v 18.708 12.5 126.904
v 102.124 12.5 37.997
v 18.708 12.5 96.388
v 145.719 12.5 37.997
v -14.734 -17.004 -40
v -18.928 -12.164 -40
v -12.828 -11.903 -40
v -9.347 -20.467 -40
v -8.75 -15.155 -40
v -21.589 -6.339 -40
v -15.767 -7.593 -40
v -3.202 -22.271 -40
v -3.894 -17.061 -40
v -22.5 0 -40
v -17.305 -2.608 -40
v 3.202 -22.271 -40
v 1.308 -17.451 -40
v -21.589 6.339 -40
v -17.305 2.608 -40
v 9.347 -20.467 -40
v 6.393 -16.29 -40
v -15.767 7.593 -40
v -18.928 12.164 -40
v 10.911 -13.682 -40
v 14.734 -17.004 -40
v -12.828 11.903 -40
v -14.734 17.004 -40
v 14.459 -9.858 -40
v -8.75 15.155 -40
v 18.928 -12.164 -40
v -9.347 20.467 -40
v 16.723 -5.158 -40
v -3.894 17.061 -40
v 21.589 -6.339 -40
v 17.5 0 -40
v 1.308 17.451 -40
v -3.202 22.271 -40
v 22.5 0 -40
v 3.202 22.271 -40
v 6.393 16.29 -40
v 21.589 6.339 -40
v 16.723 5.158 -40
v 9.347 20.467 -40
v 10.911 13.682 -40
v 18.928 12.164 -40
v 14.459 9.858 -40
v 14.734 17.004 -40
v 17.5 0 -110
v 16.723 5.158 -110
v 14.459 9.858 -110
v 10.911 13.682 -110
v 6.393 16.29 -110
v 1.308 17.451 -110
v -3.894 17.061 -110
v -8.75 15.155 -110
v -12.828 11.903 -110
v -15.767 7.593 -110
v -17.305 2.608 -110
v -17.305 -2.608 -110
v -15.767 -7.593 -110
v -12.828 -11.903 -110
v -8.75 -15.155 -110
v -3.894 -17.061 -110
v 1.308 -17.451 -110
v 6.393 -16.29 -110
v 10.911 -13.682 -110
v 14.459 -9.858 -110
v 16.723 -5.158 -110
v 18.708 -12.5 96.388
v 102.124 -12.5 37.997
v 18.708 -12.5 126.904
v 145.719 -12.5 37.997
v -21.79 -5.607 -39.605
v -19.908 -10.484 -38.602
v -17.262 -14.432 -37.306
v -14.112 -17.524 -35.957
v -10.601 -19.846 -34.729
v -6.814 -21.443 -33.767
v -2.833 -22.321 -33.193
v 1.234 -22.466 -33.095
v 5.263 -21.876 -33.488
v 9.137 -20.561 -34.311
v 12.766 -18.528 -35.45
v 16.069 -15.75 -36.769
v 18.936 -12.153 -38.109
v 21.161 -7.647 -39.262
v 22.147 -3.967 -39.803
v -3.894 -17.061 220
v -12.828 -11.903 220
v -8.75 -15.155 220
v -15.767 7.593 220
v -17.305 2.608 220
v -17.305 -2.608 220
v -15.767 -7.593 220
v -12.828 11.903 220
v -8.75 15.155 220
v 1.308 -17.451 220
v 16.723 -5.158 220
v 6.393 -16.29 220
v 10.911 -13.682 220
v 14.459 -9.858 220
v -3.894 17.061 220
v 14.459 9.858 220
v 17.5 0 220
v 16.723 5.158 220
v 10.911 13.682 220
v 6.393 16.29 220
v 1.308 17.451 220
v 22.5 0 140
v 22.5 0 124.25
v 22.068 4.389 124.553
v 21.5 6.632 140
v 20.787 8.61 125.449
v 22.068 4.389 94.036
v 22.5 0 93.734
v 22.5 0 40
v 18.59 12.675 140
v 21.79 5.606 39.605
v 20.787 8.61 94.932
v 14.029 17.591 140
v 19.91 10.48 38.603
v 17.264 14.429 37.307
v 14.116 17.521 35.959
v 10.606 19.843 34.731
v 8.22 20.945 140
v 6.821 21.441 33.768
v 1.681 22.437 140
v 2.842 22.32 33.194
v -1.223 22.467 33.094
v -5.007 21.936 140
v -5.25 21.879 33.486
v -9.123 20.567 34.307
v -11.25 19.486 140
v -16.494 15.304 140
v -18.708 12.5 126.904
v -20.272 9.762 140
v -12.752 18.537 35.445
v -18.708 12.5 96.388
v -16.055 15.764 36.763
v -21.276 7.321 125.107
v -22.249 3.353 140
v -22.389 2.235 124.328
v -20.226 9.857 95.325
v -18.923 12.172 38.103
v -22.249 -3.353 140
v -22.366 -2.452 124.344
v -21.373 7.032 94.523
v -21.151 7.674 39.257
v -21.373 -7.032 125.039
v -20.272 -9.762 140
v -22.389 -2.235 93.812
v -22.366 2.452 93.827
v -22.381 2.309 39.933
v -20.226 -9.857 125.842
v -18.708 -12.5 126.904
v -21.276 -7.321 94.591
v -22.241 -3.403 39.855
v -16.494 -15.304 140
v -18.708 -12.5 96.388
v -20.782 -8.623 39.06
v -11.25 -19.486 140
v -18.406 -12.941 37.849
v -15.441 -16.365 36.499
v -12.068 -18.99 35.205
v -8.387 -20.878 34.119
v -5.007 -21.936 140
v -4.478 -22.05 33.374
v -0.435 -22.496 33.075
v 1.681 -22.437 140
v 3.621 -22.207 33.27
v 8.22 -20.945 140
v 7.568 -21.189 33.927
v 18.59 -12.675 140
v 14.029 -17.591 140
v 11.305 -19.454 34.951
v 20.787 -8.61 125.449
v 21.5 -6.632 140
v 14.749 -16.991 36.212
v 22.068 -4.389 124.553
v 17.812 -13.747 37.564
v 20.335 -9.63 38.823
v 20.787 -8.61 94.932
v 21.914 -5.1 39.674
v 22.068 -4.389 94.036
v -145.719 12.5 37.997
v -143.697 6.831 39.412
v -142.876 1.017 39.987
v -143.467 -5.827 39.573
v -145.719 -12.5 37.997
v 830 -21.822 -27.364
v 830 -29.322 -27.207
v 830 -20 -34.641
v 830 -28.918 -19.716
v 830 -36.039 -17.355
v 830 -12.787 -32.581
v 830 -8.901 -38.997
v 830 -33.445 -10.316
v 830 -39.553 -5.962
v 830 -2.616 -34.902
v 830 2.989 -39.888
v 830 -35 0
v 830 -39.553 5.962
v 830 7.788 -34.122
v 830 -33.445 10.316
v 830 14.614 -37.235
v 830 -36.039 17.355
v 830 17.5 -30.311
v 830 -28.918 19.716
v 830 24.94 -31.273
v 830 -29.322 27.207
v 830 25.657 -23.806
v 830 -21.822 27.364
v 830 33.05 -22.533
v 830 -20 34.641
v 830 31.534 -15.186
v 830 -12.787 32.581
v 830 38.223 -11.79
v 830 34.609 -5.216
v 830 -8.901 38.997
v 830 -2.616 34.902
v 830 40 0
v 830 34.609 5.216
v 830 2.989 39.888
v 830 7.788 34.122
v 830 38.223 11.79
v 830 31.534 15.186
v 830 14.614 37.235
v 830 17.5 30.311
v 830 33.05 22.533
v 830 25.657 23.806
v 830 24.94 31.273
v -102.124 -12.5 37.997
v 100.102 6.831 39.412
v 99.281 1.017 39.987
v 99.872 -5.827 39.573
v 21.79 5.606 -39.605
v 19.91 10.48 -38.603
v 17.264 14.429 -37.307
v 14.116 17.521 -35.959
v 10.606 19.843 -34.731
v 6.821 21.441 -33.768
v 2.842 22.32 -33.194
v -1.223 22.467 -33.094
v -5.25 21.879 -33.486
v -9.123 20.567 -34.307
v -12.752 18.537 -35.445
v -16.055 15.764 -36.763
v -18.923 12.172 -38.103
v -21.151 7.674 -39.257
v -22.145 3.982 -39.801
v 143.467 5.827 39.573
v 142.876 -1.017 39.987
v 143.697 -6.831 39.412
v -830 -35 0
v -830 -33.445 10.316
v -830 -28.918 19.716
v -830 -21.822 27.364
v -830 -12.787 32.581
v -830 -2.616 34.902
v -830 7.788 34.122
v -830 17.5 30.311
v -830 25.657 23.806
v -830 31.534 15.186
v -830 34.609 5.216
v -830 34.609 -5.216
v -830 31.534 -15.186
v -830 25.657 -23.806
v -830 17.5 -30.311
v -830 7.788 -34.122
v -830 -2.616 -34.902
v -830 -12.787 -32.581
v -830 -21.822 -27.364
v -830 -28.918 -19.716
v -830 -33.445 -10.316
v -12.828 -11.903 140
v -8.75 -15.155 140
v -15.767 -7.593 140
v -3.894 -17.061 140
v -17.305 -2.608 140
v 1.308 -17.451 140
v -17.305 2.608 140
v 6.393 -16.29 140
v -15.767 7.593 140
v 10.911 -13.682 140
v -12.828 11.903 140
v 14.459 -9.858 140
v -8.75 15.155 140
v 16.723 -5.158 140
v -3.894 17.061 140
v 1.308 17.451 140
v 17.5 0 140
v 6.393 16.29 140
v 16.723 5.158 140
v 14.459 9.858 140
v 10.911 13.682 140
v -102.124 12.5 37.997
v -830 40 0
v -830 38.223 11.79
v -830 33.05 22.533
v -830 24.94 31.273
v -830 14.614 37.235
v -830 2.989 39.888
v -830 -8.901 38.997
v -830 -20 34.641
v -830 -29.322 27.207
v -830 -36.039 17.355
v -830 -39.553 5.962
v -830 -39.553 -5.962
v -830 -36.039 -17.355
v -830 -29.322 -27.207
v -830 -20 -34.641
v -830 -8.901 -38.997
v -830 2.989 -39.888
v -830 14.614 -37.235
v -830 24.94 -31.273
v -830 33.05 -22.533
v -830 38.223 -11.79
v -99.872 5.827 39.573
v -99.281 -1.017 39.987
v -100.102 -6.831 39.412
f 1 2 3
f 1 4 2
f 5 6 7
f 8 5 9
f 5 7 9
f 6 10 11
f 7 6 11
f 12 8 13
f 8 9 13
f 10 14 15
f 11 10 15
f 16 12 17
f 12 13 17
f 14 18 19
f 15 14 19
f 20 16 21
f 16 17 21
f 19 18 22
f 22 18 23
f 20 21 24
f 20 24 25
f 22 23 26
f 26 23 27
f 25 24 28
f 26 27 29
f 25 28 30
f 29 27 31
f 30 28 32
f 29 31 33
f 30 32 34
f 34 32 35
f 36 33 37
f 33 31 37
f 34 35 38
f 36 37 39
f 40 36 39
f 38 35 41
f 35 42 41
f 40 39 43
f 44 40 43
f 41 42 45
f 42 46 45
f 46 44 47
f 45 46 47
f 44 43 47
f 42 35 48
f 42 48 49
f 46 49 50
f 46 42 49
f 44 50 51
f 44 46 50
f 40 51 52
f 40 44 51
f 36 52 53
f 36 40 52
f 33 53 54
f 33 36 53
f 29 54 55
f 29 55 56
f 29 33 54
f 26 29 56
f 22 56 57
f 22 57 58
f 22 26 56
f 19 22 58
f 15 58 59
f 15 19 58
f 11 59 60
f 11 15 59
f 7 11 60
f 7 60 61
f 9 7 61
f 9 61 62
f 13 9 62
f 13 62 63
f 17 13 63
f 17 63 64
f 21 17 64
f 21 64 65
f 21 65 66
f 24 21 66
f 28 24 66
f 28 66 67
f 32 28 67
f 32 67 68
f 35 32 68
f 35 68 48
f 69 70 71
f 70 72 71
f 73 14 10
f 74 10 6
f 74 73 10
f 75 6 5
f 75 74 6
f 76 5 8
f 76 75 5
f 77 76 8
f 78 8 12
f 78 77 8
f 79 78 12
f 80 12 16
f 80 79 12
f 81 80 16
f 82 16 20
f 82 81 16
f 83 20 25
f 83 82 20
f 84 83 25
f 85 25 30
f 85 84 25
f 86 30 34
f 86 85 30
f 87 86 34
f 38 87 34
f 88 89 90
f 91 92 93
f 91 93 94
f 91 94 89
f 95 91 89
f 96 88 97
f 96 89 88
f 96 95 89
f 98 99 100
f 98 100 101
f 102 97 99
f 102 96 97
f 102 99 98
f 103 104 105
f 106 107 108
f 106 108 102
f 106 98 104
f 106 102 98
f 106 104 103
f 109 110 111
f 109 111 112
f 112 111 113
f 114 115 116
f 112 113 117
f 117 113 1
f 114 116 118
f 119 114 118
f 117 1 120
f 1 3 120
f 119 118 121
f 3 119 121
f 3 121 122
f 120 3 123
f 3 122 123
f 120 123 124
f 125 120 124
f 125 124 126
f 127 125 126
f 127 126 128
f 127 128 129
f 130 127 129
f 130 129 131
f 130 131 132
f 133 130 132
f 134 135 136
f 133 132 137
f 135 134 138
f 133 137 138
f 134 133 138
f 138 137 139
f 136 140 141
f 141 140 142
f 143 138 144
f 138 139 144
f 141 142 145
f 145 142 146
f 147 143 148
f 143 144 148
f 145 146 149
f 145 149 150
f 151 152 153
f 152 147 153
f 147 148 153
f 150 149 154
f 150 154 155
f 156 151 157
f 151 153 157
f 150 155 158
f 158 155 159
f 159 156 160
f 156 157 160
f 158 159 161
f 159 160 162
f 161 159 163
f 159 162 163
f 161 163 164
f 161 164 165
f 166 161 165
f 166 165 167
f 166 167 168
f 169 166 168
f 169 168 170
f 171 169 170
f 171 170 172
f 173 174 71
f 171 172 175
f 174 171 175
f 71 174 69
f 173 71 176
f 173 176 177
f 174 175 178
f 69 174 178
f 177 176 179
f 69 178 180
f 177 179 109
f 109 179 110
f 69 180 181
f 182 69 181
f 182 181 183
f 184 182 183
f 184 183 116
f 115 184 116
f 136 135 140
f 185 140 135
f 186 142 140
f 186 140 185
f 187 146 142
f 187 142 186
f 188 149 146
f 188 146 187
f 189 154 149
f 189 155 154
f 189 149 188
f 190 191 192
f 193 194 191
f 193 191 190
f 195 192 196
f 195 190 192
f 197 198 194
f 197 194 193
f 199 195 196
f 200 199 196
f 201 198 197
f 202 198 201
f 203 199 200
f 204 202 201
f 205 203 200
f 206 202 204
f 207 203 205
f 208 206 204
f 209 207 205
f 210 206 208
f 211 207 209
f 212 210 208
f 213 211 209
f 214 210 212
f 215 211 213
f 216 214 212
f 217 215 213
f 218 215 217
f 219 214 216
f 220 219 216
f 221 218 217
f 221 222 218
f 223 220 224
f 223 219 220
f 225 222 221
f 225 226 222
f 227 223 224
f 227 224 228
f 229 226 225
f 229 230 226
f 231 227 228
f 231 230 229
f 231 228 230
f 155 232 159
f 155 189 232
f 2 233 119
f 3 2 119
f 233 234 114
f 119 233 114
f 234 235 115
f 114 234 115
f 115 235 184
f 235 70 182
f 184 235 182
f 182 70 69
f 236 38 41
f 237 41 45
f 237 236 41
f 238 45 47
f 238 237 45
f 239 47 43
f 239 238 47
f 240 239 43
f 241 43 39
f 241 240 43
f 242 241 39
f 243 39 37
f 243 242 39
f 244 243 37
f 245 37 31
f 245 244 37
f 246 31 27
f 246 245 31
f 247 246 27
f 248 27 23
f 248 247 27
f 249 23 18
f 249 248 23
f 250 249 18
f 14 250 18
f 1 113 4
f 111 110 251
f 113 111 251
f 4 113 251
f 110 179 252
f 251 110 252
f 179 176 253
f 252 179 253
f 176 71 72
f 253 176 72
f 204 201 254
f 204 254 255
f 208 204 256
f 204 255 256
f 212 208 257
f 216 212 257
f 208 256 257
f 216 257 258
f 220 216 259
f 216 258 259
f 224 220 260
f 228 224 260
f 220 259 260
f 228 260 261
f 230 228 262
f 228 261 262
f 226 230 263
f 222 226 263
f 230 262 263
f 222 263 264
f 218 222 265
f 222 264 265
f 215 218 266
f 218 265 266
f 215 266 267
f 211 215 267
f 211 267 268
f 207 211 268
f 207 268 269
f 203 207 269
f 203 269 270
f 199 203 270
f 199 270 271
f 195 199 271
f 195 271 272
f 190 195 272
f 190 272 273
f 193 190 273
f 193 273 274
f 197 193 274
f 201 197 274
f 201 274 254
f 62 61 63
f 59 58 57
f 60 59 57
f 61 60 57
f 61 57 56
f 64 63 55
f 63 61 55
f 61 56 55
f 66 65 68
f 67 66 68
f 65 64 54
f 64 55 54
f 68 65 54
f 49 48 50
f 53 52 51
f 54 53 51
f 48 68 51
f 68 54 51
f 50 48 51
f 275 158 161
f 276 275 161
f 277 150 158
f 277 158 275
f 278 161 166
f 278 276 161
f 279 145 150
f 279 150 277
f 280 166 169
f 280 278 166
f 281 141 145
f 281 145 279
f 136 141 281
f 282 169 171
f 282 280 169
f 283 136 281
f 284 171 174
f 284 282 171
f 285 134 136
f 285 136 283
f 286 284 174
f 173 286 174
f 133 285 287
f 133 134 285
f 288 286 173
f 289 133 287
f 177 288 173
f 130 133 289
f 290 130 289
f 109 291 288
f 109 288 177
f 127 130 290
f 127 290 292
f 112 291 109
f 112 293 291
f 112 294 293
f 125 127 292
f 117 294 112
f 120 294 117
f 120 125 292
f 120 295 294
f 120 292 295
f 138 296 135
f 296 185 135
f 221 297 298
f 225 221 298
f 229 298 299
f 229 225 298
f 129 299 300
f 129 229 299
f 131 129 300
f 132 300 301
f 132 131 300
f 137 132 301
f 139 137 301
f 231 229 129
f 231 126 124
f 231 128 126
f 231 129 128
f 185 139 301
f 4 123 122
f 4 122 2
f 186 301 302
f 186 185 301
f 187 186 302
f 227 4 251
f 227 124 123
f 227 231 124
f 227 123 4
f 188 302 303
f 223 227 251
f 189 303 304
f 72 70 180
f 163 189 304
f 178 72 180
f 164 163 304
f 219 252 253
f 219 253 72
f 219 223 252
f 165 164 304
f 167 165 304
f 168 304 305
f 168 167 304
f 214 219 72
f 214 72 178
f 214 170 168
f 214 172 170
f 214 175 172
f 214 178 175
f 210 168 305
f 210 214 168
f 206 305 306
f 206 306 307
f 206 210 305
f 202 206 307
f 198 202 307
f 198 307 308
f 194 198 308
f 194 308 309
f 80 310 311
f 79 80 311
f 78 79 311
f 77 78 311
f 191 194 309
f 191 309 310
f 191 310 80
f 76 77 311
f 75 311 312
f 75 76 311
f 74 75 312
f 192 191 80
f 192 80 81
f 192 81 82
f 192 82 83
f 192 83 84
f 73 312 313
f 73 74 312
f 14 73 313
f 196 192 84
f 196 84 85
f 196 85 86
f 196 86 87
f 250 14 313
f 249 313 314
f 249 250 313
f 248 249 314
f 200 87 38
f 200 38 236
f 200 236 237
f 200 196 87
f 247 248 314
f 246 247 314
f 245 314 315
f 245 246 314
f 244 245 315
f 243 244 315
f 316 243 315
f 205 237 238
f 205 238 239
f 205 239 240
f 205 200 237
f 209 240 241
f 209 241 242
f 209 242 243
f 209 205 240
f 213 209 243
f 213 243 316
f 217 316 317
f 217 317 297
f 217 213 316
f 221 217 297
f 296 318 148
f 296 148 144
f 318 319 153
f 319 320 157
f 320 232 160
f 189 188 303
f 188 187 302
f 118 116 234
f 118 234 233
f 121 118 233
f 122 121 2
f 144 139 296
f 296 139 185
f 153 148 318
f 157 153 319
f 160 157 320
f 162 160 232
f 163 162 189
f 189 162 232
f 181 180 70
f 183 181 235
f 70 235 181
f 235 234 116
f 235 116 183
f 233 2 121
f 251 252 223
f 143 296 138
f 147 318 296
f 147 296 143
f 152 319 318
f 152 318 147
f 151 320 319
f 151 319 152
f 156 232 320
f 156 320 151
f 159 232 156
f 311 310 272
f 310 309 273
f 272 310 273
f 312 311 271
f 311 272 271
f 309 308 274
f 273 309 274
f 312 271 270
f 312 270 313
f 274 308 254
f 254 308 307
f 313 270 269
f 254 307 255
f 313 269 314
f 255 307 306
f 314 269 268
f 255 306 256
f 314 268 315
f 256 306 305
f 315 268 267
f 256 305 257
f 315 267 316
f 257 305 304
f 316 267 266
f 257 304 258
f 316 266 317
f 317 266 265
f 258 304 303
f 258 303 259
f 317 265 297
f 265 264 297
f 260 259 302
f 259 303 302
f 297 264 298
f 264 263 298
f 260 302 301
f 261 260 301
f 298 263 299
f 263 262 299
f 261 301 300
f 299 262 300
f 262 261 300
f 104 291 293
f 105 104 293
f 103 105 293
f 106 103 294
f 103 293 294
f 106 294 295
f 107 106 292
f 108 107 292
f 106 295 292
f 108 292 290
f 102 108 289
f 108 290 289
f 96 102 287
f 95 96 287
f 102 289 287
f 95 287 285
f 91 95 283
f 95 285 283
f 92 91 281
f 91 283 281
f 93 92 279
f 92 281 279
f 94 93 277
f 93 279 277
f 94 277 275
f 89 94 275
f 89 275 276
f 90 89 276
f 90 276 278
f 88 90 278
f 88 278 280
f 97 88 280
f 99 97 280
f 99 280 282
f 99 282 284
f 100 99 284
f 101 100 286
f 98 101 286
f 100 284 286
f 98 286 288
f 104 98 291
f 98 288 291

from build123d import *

# Parameters (mm, degrees)
F0_R          = 40
F1_DEPTH      = 830
F1_DEPTH_BACK = 830
F2_R          = 22.5
F3_DEPTH      = 140
F3_DEPTH_BACK = 40
F4_R          = 17.5
F5_DEPTH      = 80
F5_DEPTH_BACK = 250
F7_DEPTH      = 12.5
F8_R          = 35.000000149
F9_DEPTH      = 1660.0010001


# Not quite as in the source:
# - a pattern or mirror of a feature is missing from the dataset's text; its kind, count and spacing are read off the source's solid


with BuildPart() as f1:
    # F0 (on Right) → F1 (new body, two sides)
    with BuildSketch(Plane.YZ) as f1_sk:
        Circle(F0_R)
    extrude(amount=F1_DEPTH)
    extrude(f1_sk.sketch, amount=-F1_DEPTH_BACK)

    # F2 (on Top) → F3 (join, two sides)
    with BuildSketch(Plane.XY) as f3_sk:
        Circle(F2_R)
    extrude(amount=F3_DEPTH)
    extrude(f3_sk.sketch, amount=-F3_DEPTH_BACK)

    # F4 (on face) → F5 (join, two sides)
    with BuildSketch(Plane.XY.offset(140)) as f5_sk:
        Circle(F4_R)
    extrude(amount=F5_DEPTH)
    extrude(f5_sk.sketch, amount=-F5_DEPTH_BACK)

    # F6 (on Front) → F7 (join, symmetric)
    with BuildSketch(Plane.XZ):
        Polygon((0, 109.4836109607), (0, 140), (-200, 0), (-156.4051585152, 0), align=None)
    f7 = extrude(amount=F7_DEPTH, both=True)

    # F7_copies: F7 across plane
    add(f7.mirror(Plane(origin=(0, 0, 0), x_dir=(0, 0, 1), z_dir=(1, 0, 0))))

    # F8 (on face) → F9 (cut, through all)
    with BuildSketch(Plane(origin=(-830, 0, 0), x_dir=(0, -1, 0), z_dir=(-1, 0, 0))):
        Circle(F8_R)
    extrude(amount=-F9_DEPTH, mode=Mode.SUBTRACT)


solid = f1.part
